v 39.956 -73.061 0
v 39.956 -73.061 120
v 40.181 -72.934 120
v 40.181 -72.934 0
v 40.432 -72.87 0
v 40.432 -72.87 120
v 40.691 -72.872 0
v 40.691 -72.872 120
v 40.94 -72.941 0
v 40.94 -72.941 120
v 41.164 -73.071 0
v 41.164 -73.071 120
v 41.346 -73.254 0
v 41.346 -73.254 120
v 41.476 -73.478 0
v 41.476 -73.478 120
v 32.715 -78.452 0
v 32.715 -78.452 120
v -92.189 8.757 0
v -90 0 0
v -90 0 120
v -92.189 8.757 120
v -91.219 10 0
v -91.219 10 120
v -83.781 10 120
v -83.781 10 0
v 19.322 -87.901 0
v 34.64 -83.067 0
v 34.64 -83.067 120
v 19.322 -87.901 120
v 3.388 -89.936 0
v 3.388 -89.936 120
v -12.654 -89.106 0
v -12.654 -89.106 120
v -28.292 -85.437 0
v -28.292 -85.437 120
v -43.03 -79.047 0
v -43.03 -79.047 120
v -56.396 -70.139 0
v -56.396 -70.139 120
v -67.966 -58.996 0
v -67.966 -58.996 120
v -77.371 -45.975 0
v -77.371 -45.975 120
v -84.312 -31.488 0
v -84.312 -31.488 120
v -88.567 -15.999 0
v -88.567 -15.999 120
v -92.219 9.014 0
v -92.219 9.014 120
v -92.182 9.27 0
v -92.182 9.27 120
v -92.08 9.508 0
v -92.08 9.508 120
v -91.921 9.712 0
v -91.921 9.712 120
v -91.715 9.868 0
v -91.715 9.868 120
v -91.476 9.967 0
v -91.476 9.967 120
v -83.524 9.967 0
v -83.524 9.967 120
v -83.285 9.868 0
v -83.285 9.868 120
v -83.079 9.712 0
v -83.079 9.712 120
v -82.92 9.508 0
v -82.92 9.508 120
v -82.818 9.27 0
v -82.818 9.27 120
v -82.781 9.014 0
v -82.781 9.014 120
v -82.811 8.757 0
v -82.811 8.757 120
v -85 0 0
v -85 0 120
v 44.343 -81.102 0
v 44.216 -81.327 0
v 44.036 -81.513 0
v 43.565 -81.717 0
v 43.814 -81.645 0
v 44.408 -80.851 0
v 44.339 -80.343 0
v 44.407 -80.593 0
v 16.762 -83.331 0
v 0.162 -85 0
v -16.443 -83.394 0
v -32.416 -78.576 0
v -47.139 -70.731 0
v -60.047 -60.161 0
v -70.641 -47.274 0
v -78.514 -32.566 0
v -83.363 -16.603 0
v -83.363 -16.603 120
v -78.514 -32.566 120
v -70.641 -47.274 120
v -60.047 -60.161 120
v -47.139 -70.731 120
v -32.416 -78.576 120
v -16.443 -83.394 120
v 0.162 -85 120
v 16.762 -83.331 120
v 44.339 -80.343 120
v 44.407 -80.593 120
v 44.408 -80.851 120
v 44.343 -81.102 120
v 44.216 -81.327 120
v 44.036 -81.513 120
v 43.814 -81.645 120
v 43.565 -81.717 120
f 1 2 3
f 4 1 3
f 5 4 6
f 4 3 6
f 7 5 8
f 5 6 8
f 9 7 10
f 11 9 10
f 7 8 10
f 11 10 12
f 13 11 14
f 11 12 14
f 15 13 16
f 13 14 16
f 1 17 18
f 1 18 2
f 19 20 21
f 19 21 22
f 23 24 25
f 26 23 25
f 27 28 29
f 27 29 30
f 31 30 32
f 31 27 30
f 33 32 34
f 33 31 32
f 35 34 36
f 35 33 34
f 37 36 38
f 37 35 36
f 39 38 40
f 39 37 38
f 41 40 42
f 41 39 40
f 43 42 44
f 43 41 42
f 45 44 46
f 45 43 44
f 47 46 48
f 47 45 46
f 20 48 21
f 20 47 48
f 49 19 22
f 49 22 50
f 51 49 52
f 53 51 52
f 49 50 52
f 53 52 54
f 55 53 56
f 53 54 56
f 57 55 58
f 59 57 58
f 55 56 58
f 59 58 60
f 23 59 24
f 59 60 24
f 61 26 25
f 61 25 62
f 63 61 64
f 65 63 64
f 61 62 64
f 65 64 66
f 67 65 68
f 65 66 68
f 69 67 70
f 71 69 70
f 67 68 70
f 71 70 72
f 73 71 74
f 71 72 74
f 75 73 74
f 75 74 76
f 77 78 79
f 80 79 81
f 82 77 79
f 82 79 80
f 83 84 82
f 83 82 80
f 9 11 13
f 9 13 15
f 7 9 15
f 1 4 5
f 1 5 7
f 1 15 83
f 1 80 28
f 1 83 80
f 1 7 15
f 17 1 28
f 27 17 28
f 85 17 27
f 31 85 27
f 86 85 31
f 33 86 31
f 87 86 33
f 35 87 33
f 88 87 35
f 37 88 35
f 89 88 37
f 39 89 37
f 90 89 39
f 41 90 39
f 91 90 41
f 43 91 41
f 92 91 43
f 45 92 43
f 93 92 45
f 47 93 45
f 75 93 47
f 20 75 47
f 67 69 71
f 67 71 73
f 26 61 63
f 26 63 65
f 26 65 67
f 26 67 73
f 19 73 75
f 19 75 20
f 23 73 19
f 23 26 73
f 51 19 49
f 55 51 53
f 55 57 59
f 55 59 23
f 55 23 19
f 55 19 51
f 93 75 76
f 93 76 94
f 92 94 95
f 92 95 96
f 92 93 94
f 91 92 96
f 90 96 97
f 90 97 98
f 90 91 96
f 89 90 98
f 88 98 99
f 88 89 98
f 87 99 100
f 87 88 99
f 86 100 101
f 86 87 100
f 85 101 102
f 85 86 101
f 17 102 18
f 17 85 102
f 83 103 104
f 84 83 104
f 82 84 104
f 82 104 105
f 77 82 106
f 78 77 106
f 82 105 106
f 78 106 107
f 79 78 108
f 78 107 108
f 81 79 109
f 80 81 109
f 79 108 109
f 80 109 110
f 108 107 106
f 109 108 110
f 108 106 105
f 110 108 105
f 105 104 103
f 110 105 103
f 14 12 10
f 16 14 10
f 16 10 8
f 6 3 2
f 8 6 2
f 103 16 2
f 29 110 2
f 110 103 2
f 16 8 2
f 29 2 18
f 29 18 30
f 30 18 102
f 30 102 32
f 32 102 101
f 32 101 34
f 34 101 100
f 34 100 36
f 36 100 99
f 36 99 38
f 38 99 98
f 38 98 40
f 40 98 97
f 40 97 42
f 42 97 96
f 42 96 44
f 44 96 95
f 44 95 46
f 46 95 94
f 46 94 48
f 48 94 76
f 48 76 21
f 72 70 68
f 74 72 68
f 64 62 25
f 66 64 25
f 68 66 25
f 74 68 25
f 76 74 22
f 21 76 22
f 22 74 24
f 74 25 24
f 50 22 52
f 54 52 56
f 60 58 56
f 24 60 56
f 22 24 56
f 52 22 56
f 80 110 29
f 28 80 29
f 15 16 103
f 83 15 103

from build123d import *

# Parameters (mm, degrees)
MAIN_BODY_DEPTH           = 120
LOCKING_MECHANISM_DEPTH   = 120
LOCKING_MECHANISM_2_DEPTH = 120


with BuildPart() as part:
    # Curve → Main Body (new body)
    with BuildSketch(Plane.XY):
        with BuildLine():
            ThreePointArc((-85, 0), (-47.139087644, -70.731226598), (32.715445084, -78.451893877))
            Line((32.715445084, -78.451893877), (34.63988303, -83.066711164))
            ThreePointArc((34.63988303, -83.066711164), (-49.911975153, -74.891886986), (-90, 0))
            Line((-90, 0), (-85, 0))
        make_face()
    extrude(amount=MAIN_BODY_DEPTH)

    # Lock shape → Locking Mechanism (add)
    with BuildSketch(Plane.XY.offset(120)):
        with BuildLine():
            Line((32.715445084, -78.451893877), (39.955604844, -73.060549627))
            ThreePointArc((39.955604844, -73.060549627), (40.81748466, -72.898257413), (41.475815628, -73.477719162))
            Line((41.475815628, -73.477719162), (44.338781633, -80.343134095))
            ThreePointArc((44.338781633, -80.343134095), (44.287191647, -81.218641979), (43.565362465, -81.716776713))
            Line((43.565362465, -81.716776713), (34.63988303, -83.066711164))
            Line((34.63988303, -83.066711164), (32.715445084, -78.451893877))
        make_face()
    extrude(amount=-LOCKING_MECHANISM_DEPTH)

    # Lock shape 2 → Locking Mechanism 2 (add)
    with BuildSketch(Plane.XY.offset(120)):
        with BuildLine():
            Line((-90, 0), (-92.189366094, 8.757464375))
            ThreePointArc((-92.189366094, 8.757464375), (-92.007429032, 9.615412209), (-91.219223594, 10))
            Line((-91.219223594, 10), (-83.780776406, 10))
            ThreePointArc((-83.780776406, 10), (-82.992570968, 9.615412209), (-82.810633906, 8.757464375))
            Line((-82.810633906, 8.757464375), (-85, 0))
            Line((-85, 0), (-90, 0))
        make_face()
    extrude(amount=-LOCKING_MECHANISM_2_DEPTH)


solid = part.part
